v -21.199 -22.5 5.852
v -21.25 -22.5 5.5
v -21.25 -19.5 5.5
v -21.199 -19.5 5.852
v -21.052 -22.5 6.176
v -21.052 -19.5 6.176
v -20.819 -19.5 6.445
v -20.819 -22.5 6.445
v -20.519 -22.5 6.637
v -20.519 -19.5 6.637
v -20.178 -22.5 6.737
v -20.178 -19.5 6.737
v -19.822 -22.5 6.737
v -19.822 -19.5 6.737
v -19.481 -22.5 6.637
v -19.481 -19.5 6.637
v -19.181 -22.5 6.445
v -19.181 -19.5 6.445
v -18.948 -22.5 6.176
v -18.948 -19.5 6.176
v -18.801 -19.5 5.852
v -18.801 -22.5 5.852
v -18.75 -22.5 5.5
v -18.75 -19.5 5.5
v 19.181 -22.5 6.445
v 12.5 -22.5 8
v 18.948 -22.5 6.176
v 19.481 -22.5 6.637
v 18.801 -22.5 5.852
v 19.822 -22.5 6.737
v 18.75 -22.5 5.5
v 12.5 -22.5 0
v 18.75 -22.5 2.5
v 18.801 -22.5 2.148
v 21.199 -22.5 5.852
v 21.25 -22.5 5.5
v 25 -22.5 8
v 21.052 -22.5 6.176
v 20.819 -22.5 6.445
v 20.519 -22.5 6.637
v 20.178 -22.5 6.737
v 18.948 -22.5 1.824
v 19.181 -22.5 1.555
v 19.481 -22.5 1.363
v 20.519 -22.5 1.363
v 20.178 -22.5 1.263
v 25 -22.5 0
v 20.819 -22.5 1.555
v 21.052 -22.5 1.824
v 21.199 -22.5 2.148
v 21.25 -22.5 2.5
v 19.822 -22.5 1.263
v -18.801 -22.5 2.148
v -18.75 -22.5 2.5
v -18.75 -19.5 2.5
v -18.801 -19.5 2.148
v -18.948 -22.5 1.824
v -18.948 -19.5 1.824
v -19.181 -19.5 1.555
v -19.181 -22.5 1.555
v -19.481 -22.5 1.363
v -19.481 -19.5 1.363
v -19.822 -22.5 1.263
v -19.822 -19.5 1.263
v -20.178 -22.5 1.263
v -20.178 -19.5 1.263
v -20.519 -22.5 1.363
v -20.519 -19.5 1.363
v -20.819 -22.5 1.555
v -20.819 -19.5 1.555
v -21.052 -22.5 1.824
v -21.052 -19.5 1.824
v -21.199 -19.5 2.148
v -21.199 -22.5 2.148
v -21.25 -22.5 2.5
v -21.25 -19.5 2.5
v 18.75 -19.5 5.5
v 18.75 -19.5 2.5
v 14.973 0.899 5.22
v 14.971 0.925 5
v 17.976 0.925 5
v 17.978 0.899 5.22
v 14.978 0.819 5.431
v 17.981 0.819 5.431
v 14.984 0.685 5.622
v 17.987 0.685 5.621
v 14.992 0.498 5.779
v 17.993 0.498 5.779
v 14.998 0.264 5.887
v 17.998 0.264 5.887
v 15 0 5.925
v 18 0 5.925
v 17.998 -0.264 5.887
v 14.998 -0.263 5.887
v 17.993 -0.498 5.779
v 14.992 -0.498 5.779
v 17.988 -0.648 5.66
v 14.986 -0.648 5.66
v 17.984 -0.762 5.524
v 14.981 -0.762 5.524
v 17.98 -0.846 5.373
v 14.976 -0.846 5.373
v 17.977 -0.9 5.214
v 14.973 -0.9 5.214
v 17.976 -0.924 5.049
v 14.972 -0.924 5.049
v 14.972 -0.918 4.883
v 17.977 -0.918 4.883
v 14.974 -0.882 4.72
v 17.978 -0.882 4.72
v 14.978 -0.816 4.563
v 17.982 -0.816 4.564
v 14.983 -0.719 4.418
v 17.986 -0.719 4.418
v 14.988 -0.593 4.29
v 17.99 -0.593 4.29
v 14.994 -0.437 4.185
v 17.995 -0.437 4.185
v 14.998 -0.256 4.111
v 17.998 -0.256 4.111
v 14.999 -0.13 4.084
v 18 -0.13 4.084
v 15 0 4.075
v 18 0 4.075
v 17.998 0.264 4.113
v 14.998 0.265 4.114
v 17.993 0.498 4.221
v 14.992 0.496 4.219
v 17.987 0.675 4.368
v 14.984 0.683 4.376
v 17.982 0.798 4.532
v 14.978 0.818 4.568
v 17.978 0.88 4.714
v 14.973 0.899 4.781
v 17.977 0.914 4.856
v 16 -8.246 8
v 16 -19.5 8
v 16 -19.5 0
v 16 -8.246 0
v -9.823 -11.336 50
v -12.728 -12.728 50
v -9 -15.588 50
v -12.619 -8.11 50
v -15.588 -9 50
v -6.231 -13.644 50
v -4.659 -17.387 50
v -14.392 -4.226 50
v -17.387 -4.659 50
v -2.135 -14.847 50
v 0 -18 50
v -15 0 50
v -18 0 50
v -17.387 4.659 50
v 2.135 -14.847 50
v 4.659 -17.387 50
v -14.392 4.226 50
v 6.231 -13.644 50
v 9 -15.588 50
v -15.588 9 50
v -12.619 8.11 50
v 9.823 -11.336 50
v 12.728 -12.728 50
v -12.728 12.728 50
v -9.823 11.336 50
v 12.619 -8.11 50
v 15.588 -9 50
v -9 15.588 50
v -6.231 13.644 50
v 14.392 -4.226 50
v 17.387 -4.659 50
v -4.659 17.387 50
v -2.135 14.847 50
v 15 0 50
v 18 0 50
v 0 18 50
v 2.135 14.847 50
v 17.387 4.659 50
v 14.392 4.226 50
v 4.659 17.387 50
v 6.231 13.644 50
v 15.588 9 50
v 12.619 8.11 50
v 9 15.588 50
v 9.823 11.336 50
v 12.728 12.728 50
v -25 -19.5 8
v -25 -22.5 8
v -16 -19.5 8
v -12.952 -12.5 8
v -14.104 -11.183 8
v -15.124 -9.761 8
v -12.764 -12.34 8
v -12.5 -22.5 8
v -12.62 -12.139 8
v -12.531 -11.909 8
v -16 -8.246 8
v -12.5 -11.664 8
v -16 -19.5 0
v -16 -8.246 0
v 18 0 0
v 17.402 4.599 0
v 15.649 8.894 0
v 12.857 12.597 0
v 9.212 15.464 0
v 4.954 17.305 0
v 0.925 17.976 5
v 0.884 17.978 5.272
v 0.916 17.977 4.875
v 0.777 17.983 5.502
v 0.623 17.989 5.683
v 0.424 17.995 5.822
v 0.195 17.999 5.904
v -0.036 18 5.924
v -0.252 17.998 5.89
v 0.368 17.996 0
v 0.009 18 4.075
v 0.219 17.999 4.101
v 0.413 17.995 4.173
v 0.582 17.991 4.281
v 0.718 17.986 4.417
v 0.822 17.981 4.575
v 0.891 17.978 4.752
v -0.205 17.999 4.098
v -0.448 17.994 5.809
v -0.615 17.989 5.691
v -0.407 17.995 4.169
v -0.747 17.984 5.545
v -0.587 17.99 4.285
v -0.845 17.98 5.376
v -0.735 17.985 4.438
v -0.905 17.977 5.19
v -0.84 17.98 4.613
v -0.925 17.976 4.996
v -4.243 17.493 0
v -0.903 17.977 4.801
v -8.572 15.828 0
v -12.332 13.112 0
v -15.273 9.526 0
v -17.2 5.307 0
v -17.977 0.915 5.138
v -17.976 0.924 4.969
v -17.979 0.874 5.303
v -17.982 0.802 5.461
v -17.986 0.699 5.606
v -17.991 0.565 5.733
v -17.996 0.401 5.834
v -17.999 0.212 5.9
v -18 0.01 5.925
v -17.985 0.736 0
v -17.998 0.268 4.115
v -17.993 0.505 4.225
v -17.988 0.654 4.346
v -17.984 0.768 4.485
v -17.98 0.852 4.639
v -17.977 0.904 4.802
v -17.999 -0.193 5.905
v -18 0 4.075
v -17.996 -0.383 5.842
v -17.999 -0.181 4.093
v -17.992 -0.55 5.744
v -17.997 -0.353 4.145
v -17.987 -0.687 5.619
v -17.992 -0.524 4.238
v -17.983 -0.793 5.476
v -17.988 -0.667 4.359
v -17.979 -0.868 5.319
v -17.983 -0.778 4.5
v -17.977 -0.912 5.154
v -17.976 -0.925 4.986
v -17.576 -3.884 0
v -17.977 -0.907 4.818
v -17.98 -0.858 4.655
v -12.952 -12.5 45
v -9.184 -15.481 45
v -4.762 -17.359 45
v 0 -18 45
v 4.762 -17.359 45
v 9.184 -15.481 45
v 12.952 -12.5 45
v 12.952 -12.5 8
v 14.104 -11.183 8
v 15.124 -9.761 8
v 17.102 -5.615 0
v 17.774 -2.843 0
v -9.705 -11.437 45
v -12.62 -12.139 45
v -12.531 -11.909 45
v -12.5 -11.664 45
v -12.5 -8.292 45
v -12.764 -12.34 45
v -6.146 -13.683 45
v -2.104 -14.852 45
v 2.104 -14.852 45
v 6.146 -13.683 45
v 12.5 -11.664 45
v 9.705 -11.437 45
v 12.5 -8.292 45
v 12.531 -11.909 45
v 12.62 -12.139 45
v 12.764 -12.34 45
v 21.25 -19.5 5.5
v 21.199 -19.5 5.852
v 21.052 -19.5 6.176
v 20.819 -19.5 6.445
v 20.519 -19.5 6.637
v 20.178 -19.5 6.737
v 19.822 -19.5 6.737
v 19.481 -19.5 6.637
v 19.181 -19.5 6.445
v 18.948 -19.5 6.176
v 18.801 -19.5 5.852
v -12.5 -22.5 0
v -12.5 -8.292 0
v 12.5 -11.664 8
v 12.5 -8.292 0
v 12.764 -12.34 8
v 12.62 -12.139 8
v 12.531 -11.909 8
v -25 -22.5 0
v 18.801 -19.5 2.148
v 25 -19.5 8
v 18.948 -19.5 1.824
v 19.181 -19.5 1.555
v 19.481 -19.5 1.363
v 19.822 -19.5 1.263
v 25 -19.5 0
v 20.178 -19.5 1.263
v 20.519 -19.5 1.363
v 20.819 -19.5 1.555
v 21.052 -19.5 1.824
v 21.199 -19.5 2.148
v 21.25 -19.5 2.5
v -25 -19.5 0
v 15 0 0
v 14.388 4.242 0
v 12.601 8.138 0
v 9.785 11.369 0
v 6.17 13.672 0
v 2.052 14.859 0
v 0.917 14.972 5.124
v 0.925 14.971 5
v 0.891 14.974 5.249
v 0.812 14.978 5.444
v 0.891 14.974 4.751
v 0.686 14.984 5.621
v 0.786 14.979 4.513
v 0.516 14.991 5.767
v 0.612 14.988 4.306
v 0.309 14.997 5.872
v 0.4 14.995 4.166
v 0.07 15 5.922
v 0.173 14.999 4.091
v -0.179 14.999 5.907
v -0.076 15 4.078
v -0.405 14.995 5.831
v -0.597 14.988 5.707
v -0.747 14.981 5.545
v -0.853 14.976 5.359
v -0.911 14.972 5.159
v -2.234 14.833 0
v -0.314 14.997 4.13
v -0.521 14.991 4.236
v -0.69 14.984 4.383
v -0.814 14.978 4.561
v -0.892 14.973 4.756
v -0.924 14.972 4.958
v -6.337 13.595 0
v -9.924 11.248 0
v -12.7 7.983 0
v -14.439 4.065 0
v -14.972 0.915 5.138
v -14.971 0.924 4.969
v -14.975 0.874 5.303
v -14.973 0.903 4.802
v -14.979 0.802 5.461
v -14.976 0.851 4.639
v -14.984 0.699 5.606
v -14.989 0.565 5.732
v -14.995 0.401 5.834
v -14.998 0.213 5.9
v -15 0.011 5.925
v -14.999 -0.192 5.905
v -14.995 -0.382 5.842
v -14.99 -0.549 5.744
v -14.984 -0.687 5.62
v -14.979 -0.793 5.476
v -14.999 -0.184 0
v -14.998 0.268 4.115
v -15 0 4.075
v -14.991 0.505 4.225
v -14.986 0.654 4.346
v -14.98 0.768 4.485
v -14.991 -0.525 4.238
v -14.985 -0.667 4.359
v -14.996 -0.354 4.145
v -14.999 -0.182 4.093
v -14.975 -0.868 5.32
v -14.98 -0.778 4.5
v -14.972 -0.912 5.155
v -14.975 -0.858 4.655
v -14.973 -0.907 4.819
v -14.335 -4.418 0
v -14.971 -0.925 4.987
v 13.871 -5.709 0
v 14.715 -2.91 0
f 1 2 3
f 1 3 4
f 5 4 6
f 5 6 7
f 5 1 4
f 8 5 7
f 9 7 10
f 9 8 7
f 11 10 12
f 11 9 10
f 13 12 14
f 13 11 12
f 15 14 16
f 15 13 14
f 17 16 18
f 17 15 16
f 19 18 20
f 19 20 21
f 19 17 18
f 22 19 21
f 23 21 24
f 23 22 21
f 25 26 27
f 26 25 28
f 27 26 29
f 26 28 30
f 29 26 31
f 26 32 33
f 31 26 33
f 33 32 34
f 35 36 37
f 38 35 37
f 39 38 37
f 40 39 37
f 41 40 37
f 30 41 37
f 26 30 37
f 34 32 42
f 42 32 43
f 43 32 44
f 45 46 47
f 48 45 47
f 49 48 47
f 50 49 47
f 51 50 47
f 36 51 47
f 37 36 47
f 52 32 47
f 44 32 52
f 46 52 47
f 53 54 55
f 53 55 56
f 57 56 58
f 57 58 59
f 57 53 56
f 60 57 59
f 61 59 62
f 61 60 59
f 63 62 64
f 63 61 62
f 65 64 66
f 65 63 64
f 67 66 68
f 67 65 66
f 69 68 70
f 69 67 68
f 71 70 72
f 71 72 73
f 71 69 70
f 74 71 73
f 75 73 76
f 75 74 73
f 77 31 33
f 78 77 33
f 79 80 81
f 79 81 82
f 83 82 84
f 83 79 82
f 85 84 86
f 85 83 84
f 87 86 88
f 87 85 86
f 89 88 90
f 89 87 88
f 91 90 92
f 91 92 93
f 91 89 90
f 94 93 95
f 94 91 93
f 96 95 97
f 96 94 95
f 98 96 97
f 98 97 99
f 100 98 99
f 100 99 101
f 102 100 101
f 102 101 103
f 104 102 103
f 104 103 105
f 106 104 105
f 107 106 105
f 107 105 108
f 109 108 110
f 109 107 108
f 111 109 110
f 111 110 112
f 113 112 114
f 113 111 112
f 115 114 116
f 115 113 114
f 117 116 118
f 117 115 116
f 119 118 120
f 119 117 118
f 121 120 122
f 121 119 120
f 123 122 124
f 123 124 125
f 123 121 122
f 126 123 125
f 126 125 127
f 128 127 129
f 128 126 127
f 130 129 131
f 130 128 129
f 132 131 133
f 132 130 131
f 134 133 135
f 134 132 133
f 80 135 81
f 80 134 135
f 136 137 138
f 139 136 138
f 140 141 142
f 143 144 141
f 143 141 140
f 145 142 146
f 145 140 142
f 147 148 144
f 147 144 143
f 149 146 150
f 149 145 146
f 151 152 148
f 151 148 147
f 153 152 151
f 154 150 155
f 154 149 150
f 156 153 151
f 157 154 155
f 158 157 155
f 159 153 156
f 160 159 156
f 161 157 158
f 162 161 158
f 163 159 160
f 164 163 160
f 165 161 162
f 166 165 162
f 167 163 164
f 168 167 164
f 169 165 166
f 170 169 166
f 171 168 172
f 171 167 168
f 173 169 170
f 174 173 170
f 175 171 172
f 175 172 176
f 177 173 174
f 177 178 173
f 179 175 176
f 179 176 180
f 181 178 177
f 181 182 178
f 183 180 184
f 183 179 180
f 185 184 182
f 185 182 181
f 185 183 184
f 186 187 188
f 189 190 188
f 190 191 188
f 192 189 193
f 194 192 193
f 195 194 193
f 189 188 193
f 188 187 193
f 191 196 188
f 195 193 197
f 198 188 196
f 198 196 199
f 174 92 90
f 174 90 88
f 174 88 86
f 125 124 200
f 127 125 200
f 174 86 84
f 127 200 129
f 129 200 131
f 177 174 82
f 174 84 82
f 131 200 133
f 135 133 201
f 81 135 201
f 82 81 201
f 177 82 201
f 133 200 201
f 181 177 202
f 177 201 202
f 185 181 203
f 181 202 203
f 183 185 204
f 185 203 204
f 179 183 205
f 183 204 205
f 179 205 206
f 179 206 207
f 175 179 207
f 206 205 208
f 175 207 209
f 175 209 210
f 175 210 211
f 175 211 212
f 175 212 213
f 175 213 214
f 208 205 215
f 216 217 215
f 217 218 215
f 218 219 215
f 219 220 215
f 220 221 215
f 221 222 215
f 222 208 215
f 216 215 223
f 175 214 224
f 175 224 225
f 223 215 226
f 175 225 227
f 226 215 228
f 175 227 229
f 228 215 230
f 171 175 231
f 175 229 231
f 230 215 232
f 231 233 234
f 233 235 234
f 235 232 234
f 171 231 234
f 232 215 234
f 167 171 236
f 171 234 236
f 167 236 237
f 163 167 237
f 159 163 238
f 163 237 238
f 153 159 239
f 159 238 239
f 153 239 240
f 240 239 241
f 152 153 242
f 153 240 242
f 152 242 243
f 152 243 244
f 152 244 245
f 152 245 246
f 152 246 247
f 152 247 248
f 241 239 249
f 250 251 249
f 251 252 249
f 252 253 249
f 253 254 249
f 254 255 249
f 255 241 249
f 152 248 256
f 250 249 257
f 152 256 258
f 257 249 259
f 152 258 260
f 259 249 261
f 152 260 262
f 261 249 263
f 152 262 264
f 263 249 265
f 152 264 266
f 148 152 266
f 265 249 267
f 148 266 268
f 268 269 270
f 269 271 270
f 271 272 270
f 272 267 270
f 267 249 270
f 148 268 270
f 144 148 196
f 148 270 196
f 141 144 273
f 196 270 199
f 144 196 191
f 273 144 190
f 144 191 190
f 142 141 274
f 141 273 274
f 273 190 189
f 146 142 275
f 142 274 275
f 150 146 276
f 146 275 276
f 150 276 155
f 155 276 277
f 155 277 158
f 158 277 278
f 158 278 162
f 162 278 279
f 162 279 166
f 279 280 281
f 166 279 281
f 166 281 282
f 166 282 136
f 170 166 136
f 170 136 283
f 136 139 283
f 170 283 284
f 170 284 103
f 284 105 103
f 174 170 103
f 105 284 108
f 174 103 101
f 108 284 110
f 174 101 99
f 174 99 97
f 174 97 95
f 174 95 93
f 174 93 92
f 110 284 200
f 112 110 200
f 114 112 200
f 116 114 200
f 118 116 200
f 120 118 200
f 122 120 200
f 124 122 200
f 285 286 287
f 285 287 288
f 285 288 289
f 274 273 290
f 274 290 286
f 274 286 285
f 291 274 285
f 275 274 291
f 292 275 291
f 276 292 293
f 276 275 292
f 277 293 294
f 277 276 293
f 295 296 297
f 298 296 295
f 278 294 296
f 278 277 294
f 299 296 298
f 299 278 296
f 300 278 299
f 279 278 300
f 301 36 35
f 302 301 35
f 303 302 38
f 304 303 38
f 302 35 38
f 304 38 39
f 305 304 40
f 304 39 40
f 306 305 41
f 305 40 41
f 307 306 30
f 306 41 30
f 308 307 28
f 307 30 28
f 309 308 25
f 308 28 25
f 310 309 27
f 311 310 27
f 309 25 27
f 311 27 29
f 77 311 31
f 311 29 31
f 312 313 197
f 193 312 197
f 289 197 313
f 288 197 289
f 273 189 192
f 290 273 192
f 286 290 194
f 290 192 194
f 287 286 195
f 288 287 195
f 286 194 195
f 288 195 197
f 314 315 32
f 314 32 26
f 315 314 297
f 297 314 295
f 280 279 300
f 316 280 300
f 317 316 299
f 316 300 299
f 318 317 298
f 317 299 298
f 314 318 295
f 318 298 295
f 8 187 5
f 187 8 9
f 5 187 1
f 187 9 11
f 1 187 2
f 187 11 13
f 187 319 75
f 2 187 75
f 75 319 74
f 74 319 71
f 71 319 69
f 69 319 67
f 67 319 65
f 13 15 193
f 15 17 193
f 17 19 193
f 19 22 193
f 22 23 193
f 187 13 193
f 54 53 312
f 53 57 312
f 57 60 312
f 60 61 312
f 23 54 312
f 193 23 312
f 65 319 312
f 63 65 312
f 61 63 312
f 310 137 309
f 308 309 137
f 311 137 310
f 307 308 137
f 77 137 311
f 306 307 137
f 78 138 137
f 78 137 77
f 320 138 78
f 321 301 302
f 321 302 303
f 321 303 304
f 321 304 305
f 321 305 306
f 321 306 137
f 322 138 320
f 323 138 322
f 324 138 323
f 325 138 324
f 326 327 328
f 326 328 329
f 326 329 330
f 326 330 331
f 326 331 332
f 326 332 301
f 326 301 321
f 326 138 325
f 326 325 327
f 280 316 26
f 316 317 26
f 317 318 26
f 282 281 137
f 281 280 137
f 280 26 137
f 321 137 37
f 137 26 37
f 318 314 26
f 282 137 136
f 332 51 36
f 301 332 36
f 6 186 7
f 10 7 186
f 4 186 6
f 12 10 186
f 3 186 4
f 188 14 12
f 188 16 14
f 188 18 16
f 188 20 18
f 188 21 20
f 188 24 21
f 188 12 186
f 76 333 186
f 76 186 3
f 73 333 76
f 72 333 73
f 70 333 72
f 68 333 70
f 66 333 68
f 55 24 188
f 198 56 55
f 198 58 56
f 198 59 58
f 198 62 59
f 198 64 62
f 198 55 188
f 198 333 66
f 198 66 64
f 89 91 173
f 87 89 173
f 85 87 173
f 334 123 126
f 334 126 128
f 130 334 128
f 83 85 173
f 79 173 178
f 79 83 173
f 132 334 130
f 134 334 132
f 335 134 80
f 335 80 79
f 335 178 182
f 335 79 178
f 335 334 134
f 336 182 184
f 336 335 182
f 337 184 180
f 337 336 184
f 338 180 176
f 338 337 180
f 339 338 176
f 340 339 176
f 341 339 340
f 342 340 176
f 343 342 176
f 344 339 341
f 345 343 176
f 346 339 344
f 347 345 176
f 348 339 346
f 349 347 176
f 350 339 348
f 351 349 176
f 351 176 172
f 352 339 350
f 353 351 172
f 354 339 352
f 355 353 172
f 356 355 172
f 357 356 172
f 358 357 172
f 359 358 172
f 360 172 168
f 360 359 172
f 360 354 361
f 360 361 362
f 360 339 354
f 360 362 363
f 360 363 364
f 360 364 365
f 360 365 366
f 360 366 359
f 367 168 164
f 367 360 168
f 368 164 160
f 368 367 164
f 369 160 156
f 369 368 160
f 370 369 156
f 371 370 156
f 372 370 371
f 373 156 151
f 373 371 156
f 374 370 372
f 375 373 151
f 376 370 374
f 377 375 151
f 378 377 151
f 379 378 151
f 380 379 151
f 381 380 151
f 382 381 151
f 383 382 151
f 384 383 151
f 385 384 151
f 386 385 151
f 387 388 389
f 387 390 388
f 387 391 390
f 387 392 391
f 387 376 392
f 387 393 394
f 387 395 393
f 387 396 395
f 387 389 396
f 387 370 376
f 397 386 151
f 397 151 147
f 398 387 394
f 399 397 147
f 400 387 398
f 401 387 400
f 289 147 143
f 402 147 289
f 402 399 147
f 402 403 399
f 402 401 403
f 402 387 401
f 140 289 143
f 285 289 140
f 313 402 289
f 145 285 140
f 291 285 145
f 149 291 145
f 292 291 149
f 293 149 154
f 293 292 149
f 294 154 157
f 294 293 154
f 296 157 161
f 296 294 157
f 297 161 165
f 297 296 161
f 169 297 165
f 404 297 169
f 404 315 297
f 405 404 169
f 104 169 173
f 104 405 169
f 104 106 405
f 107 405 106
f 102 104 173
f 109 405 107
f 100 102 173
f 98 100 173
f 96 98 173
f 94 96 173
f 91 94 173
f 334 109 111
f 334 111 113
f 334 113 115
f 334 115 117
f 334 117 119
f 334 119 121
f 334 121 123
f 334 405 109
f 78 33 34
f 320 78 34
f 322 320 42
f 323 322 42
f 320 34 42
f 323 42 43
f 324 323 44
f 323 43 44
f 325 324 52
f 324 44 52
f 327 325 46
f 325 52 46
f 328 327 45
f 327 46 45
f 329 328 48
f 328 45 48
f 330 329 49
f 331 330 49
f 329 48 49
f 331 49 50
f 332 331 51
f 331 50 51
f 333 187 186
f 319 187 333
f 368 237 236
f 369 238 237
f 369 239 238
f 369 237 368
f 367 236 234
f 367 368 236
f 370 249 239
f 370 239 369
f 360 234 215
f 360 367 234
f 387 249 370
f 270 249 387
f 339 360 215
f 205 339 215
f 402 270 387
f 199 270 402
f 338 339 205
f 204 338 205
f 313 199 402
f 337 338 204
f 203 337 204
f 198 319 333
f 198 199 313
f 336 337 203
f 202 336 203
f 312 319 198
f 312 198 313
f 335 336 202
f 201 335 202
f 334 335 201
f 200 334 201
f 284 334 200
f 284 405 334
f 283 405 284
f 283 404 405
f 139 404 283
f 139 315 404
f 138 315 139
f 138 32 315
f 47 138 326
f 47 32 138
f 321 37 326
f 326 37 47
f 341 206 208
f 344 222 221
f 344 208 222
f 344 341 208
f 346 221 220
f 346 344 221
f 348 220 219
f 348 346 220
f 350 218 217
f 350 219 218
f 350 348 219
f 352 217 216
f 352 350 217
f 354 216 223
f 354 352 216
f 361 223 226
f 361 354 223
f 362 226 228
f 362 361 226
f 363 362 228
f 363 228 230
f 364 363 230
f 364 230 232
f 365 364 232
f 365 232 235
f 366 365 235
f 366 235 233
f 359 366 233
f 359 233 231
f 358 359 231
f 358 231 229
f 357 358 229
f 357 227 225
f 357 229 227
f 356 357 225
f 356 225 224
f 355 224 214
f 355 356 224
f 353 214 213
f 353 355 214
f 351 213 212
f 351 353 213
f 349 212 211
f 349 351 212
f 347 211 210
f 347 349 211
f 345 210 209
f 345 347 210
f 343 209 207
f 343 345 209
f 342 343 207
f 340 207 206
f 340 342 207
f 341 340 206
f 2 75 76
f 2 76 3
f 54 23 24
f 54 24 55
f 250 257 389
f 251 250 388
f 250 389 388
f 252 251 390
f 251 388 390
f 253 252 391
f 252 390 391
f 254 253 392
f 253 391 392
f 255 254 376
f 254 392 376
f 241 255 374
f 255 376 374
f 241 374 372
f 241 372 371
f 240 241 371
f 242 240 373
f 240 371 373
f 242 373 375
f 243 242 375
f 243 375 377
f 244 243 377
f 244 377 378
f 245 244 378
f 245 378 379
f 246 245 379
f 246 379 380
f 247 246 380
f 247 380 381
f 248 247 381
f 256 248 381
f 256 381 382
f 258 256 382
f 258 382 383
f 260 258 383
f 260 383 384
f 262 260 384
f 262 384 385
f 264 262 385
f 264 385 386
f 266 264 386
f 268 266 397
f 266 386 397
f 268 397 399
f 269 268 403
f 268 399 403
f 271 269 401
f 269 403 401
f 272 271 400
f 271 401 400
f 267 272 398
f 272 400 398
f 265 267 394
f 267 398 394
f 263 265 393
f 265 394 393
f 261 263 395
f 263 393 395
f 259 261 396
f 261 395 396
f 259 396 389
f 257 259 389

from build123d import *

# Parameters (mm, degrees)
SKETCH1_R                = 18
SKETCH1_R_2              = 15
BOSS_EXTRUDE1_DEPTH      = 50
SKETCH2_W                = 50
SKETCH2_H                = 8
BOSS_EXTRUDE2_DEPTH      = 3
BOSS_EXTRUDE5_REACH      = 69.315
BOSS_EXTRUDE5_END_RADIUS = 18
SKETCH9_W                = 32
SKETCH9_H                = 8
SKETCH4_W                = 37
SKETCH4_H                = 10
CUT_EXTRUDE1_DEPTH       = 75.204110398
CUT_EXTRUDE2_REACH       = 71.031
CUT_EXTRUDE2_END_RADIUS  = 15
SKETCH6_W                = 25
SKETCH6_H                = 45
FILLET1_R                = 1
CUT_EXTRUDE3_REACH       = 62.26
CUT_EXTRUDE3_END_RADIUS  = 18
SKETCH7_R                = 0.925
CIRPATTERN1_START        = 14.971451916
CIRPATTERN1_OUTLINE_R    = 0.925
CIRPATTERN1_DEPTH        = 3.028548184
CIRPATTERN1_START_2      = 14.9714519
CIRPATTERN1_2_OUTLINE_R  = 0.925
CIRPATTERN1_2_DEPTH      = 3.028548184


# Read off the part's stored shape, not the designer's step: CirPattern1
with BuildPart() as part:
    # Sketch1 → Boss-Extrude1 (new body)
    with BuildSketch(Plane.XY):
        Circle(SKETCH1_R)
        Circle(SKETCH1_R_2, mode=Mode.SUBTRACT)
    extrude(amount=BOSS_EXTRUDE1_DEPTH)



with BuildPart() as body_2:
    # Sketch2 → Boss-Extrude2 (new body)
    with BuildSketch(Plane(origin=(0, -22.5, 0), x_dir=(1, 0, 0), z_dir=(0, 1, 0))):
        with Locations((0, -4)):
            Rectangle(SKETCH2_W, SKETCH2_H)
        with BuildLine():
            Line((21.25, -2.5), (21.25, -5.5))
            ThreePointArc((21.25, -5.5), (20, -6.75), (18.75, -5.5))
            Line((18.75, -5.5), (18.75, -2.5))
            ThreePointArc((18.75, -2.5), (20, -1.25), (21.25, -2.5))
        make_face(mode=Mode.SUBTRACT)
        with BuildLine():
            Line((-21.25, -2.5), (-21.25, -5.5))
            ThreePointArc((-21.25, -5.5), (-20, -6.75), (-18.75, -5.5))
            Line((-18.75, -5.5), (-18.75, -2.5))
            ThreePointArc((-18.75, -2.5), (-20, -1.25), (-21.25, -2.5))
        make_face(mode=Mode.SUBTRACT)
    extrude(amount=BOSS_EXTRUDE2_DEPTH)


with BuildPart() as part_1:
    add(part.part)

    add(body_2.part)  # Boss-Extrude5 merges body 2
    # Boss-Extrude5: up to this cylinder (the profile starts outside it)
    boss_extrude5_end = Plane(origin=(0, 0, 4), z_dir=(0, 0, -1)) * Cylinder(BOSS_EXTRUDE5_END_RADIUS, 175.63, mode=Mode.PRIVATE)
    # Sketch9 → Boss-Extrude5 (add, up to the surface)
    with BuildSketch(Plane(origin=(0, -19.5, 0), x_dir=(1, 0, 0), z_dir=(0, 1, 0)), mode=Mode.PRIVATE) as boss_extrude5_sk1:
        with Locations((0, -4)):
            Rectangle(SKETCH9_W, SKETCH9_H)
    boss_extrude5_tool1 = extrude(boss_extrude5_sk1.sketch, amount=BOSS_EXTRUDE5_REACH, mode=Mode.PRIVATE) - boss_extrude5_end
    add(boss_extrude5_tool1.solids().sort_by_distance((0, -19.5, 4))[0])

    # Sketch4 → Cut-Extrude1 (cut, through all)
    with BuildSketch(Plane.ZY.offset(25)):
        with Locations((26.5, -17.5)):
            Rectangle(SKETCH4_W, SKETCH4_H)
    extrude(amount=-CUT_EXTRUDE1_DEPTH, mode=Mode.SUBTRACT)

    # Cut-Extrude2: up to this cylinder (the profile starts outside it)
    cut_extrude2_end = Plane(origin=(0, 0, 22.5), z_dir=(0, 0, -1)) * Cylinder(CUT_EXTRUDE2_END_RADIUS, 173.062, mode=Mode.PRIVATE)
    # Sketch6 → Cut-Extrude2 (cut, up to the surface)
    with BuildSketch(Plane.XZ.offset(22.5), mode=Mode.PRIVATE) as cut_extrude2_sk1:
        with Locations((0, 22.5)):
            Rectangle(SKETCH6_W, SKETCH6_H)
    cut_extrude2_tool1 = extrude(cut_extrude2_sk1.sketch, amount=-CUT_EXTRUDE2_REACH, mode=Mode.PRIVATE) - cut_extrude2_end
    add(cut_extrude2_tool1.solids().sort_by_distance((0, -22.5, 22.5))[0], mode=Mode.SUBTRACT)

    # Fillet1
    # the kernel refuses this fillet: 1 mm, written as the material it takes off along each edge
    with BuildSketch(Plane(origin=(-12.5, -12.5, 8), x_dir=(-1.0, 1.3760033648058773e-12, 0), z_dir=(0, 0, 1)), Plane(origin=(12.5, -12.5, 45), x_dir=(1.0, 1.3602776120652602e-12, 0), z_dir=(0, 0, -1))) as fillet1_piece_1:
        with BuildLine():
            CenterArc((1, -0.836369457), FILLET1_R, 123.241294146, 56.758705854)
            Line((0, -0.836369457), (-0.02, -0.836369457))
            Line((-0.02, -0.836369457), (-0.02, 0))
            Line((-0.02, 0), (0, 0.02))
            ThreePointArc((0, 0.02), (0.225916923, 0.02), (0.440870524, 0.016727389))
            Line((0.440870524, 0.016727389), (0.451833847, 0))
        make_face()
    extrude(amount=37, mode=Mode.SUBTRACT)

    # Cut-Extrude3: up to this cylinder (the profile starts inside it)
    cut_extrude3_end = Plane(origin=(0, 0, 5), z_dir=(0, 0, -1)) * Cylinder(CUT_EXTRUDE3_END_RADIUS, 161.52, mode=Mode.PRIVATE)
    # Sketch7 → Cut-Extrude3 (cut, up to the surface)
    with BuildSketch(Plane(origin=(0, 0, 0), x_dir=(0, 0, -1), z_dir=(1, 0, 0)), mode=Mode.PRIVATE) as cut_extrude3_sk1:
        with Locations((-5, 0)):
            Circle(SKETCH7_R)
    cut_extrude3_tool1 = extrude(cut_extrude3_sk1.sketch, amount=-CUT_EXTRUDE3_REACH, mode=Mode.PRIVATE) & cut_extrude3_end
    add(cut_extrude3_tool1.solids().sort_by_distance((0, 0, 5))[0], mode=Mode.SUBTRACT)

    # CirPattern1 outline → CirPattern1 (cut)
    with BuildSketch(Plane.YZ.offset(CIRPATTERN1_START)):
        with Locations((0, 5)):
            Circle(CIRPATTERN1_OUTLINE_R)
    extrude(amount=CIRPATTERN1_DEPTH, mode=Mode.SUBTRACT)

    # CirPattern1 2 outline → CirPattern1 2 (cut)
    with BuildSketch(Plane(origin=(0, 0, 0), x_dir=(1, 0, 0), z_dir=(0, 1, 0)).offset(CIRPATTERN1_START_2)):
        with Locations((0, -5)):
            Circle(CIRPATTERN1_2_OUTLINE_R)
    extrude(amount=CIRPATTERN1_2_DEPTH, mode=Mode.SUBTRACT)


solid = part_1.part
